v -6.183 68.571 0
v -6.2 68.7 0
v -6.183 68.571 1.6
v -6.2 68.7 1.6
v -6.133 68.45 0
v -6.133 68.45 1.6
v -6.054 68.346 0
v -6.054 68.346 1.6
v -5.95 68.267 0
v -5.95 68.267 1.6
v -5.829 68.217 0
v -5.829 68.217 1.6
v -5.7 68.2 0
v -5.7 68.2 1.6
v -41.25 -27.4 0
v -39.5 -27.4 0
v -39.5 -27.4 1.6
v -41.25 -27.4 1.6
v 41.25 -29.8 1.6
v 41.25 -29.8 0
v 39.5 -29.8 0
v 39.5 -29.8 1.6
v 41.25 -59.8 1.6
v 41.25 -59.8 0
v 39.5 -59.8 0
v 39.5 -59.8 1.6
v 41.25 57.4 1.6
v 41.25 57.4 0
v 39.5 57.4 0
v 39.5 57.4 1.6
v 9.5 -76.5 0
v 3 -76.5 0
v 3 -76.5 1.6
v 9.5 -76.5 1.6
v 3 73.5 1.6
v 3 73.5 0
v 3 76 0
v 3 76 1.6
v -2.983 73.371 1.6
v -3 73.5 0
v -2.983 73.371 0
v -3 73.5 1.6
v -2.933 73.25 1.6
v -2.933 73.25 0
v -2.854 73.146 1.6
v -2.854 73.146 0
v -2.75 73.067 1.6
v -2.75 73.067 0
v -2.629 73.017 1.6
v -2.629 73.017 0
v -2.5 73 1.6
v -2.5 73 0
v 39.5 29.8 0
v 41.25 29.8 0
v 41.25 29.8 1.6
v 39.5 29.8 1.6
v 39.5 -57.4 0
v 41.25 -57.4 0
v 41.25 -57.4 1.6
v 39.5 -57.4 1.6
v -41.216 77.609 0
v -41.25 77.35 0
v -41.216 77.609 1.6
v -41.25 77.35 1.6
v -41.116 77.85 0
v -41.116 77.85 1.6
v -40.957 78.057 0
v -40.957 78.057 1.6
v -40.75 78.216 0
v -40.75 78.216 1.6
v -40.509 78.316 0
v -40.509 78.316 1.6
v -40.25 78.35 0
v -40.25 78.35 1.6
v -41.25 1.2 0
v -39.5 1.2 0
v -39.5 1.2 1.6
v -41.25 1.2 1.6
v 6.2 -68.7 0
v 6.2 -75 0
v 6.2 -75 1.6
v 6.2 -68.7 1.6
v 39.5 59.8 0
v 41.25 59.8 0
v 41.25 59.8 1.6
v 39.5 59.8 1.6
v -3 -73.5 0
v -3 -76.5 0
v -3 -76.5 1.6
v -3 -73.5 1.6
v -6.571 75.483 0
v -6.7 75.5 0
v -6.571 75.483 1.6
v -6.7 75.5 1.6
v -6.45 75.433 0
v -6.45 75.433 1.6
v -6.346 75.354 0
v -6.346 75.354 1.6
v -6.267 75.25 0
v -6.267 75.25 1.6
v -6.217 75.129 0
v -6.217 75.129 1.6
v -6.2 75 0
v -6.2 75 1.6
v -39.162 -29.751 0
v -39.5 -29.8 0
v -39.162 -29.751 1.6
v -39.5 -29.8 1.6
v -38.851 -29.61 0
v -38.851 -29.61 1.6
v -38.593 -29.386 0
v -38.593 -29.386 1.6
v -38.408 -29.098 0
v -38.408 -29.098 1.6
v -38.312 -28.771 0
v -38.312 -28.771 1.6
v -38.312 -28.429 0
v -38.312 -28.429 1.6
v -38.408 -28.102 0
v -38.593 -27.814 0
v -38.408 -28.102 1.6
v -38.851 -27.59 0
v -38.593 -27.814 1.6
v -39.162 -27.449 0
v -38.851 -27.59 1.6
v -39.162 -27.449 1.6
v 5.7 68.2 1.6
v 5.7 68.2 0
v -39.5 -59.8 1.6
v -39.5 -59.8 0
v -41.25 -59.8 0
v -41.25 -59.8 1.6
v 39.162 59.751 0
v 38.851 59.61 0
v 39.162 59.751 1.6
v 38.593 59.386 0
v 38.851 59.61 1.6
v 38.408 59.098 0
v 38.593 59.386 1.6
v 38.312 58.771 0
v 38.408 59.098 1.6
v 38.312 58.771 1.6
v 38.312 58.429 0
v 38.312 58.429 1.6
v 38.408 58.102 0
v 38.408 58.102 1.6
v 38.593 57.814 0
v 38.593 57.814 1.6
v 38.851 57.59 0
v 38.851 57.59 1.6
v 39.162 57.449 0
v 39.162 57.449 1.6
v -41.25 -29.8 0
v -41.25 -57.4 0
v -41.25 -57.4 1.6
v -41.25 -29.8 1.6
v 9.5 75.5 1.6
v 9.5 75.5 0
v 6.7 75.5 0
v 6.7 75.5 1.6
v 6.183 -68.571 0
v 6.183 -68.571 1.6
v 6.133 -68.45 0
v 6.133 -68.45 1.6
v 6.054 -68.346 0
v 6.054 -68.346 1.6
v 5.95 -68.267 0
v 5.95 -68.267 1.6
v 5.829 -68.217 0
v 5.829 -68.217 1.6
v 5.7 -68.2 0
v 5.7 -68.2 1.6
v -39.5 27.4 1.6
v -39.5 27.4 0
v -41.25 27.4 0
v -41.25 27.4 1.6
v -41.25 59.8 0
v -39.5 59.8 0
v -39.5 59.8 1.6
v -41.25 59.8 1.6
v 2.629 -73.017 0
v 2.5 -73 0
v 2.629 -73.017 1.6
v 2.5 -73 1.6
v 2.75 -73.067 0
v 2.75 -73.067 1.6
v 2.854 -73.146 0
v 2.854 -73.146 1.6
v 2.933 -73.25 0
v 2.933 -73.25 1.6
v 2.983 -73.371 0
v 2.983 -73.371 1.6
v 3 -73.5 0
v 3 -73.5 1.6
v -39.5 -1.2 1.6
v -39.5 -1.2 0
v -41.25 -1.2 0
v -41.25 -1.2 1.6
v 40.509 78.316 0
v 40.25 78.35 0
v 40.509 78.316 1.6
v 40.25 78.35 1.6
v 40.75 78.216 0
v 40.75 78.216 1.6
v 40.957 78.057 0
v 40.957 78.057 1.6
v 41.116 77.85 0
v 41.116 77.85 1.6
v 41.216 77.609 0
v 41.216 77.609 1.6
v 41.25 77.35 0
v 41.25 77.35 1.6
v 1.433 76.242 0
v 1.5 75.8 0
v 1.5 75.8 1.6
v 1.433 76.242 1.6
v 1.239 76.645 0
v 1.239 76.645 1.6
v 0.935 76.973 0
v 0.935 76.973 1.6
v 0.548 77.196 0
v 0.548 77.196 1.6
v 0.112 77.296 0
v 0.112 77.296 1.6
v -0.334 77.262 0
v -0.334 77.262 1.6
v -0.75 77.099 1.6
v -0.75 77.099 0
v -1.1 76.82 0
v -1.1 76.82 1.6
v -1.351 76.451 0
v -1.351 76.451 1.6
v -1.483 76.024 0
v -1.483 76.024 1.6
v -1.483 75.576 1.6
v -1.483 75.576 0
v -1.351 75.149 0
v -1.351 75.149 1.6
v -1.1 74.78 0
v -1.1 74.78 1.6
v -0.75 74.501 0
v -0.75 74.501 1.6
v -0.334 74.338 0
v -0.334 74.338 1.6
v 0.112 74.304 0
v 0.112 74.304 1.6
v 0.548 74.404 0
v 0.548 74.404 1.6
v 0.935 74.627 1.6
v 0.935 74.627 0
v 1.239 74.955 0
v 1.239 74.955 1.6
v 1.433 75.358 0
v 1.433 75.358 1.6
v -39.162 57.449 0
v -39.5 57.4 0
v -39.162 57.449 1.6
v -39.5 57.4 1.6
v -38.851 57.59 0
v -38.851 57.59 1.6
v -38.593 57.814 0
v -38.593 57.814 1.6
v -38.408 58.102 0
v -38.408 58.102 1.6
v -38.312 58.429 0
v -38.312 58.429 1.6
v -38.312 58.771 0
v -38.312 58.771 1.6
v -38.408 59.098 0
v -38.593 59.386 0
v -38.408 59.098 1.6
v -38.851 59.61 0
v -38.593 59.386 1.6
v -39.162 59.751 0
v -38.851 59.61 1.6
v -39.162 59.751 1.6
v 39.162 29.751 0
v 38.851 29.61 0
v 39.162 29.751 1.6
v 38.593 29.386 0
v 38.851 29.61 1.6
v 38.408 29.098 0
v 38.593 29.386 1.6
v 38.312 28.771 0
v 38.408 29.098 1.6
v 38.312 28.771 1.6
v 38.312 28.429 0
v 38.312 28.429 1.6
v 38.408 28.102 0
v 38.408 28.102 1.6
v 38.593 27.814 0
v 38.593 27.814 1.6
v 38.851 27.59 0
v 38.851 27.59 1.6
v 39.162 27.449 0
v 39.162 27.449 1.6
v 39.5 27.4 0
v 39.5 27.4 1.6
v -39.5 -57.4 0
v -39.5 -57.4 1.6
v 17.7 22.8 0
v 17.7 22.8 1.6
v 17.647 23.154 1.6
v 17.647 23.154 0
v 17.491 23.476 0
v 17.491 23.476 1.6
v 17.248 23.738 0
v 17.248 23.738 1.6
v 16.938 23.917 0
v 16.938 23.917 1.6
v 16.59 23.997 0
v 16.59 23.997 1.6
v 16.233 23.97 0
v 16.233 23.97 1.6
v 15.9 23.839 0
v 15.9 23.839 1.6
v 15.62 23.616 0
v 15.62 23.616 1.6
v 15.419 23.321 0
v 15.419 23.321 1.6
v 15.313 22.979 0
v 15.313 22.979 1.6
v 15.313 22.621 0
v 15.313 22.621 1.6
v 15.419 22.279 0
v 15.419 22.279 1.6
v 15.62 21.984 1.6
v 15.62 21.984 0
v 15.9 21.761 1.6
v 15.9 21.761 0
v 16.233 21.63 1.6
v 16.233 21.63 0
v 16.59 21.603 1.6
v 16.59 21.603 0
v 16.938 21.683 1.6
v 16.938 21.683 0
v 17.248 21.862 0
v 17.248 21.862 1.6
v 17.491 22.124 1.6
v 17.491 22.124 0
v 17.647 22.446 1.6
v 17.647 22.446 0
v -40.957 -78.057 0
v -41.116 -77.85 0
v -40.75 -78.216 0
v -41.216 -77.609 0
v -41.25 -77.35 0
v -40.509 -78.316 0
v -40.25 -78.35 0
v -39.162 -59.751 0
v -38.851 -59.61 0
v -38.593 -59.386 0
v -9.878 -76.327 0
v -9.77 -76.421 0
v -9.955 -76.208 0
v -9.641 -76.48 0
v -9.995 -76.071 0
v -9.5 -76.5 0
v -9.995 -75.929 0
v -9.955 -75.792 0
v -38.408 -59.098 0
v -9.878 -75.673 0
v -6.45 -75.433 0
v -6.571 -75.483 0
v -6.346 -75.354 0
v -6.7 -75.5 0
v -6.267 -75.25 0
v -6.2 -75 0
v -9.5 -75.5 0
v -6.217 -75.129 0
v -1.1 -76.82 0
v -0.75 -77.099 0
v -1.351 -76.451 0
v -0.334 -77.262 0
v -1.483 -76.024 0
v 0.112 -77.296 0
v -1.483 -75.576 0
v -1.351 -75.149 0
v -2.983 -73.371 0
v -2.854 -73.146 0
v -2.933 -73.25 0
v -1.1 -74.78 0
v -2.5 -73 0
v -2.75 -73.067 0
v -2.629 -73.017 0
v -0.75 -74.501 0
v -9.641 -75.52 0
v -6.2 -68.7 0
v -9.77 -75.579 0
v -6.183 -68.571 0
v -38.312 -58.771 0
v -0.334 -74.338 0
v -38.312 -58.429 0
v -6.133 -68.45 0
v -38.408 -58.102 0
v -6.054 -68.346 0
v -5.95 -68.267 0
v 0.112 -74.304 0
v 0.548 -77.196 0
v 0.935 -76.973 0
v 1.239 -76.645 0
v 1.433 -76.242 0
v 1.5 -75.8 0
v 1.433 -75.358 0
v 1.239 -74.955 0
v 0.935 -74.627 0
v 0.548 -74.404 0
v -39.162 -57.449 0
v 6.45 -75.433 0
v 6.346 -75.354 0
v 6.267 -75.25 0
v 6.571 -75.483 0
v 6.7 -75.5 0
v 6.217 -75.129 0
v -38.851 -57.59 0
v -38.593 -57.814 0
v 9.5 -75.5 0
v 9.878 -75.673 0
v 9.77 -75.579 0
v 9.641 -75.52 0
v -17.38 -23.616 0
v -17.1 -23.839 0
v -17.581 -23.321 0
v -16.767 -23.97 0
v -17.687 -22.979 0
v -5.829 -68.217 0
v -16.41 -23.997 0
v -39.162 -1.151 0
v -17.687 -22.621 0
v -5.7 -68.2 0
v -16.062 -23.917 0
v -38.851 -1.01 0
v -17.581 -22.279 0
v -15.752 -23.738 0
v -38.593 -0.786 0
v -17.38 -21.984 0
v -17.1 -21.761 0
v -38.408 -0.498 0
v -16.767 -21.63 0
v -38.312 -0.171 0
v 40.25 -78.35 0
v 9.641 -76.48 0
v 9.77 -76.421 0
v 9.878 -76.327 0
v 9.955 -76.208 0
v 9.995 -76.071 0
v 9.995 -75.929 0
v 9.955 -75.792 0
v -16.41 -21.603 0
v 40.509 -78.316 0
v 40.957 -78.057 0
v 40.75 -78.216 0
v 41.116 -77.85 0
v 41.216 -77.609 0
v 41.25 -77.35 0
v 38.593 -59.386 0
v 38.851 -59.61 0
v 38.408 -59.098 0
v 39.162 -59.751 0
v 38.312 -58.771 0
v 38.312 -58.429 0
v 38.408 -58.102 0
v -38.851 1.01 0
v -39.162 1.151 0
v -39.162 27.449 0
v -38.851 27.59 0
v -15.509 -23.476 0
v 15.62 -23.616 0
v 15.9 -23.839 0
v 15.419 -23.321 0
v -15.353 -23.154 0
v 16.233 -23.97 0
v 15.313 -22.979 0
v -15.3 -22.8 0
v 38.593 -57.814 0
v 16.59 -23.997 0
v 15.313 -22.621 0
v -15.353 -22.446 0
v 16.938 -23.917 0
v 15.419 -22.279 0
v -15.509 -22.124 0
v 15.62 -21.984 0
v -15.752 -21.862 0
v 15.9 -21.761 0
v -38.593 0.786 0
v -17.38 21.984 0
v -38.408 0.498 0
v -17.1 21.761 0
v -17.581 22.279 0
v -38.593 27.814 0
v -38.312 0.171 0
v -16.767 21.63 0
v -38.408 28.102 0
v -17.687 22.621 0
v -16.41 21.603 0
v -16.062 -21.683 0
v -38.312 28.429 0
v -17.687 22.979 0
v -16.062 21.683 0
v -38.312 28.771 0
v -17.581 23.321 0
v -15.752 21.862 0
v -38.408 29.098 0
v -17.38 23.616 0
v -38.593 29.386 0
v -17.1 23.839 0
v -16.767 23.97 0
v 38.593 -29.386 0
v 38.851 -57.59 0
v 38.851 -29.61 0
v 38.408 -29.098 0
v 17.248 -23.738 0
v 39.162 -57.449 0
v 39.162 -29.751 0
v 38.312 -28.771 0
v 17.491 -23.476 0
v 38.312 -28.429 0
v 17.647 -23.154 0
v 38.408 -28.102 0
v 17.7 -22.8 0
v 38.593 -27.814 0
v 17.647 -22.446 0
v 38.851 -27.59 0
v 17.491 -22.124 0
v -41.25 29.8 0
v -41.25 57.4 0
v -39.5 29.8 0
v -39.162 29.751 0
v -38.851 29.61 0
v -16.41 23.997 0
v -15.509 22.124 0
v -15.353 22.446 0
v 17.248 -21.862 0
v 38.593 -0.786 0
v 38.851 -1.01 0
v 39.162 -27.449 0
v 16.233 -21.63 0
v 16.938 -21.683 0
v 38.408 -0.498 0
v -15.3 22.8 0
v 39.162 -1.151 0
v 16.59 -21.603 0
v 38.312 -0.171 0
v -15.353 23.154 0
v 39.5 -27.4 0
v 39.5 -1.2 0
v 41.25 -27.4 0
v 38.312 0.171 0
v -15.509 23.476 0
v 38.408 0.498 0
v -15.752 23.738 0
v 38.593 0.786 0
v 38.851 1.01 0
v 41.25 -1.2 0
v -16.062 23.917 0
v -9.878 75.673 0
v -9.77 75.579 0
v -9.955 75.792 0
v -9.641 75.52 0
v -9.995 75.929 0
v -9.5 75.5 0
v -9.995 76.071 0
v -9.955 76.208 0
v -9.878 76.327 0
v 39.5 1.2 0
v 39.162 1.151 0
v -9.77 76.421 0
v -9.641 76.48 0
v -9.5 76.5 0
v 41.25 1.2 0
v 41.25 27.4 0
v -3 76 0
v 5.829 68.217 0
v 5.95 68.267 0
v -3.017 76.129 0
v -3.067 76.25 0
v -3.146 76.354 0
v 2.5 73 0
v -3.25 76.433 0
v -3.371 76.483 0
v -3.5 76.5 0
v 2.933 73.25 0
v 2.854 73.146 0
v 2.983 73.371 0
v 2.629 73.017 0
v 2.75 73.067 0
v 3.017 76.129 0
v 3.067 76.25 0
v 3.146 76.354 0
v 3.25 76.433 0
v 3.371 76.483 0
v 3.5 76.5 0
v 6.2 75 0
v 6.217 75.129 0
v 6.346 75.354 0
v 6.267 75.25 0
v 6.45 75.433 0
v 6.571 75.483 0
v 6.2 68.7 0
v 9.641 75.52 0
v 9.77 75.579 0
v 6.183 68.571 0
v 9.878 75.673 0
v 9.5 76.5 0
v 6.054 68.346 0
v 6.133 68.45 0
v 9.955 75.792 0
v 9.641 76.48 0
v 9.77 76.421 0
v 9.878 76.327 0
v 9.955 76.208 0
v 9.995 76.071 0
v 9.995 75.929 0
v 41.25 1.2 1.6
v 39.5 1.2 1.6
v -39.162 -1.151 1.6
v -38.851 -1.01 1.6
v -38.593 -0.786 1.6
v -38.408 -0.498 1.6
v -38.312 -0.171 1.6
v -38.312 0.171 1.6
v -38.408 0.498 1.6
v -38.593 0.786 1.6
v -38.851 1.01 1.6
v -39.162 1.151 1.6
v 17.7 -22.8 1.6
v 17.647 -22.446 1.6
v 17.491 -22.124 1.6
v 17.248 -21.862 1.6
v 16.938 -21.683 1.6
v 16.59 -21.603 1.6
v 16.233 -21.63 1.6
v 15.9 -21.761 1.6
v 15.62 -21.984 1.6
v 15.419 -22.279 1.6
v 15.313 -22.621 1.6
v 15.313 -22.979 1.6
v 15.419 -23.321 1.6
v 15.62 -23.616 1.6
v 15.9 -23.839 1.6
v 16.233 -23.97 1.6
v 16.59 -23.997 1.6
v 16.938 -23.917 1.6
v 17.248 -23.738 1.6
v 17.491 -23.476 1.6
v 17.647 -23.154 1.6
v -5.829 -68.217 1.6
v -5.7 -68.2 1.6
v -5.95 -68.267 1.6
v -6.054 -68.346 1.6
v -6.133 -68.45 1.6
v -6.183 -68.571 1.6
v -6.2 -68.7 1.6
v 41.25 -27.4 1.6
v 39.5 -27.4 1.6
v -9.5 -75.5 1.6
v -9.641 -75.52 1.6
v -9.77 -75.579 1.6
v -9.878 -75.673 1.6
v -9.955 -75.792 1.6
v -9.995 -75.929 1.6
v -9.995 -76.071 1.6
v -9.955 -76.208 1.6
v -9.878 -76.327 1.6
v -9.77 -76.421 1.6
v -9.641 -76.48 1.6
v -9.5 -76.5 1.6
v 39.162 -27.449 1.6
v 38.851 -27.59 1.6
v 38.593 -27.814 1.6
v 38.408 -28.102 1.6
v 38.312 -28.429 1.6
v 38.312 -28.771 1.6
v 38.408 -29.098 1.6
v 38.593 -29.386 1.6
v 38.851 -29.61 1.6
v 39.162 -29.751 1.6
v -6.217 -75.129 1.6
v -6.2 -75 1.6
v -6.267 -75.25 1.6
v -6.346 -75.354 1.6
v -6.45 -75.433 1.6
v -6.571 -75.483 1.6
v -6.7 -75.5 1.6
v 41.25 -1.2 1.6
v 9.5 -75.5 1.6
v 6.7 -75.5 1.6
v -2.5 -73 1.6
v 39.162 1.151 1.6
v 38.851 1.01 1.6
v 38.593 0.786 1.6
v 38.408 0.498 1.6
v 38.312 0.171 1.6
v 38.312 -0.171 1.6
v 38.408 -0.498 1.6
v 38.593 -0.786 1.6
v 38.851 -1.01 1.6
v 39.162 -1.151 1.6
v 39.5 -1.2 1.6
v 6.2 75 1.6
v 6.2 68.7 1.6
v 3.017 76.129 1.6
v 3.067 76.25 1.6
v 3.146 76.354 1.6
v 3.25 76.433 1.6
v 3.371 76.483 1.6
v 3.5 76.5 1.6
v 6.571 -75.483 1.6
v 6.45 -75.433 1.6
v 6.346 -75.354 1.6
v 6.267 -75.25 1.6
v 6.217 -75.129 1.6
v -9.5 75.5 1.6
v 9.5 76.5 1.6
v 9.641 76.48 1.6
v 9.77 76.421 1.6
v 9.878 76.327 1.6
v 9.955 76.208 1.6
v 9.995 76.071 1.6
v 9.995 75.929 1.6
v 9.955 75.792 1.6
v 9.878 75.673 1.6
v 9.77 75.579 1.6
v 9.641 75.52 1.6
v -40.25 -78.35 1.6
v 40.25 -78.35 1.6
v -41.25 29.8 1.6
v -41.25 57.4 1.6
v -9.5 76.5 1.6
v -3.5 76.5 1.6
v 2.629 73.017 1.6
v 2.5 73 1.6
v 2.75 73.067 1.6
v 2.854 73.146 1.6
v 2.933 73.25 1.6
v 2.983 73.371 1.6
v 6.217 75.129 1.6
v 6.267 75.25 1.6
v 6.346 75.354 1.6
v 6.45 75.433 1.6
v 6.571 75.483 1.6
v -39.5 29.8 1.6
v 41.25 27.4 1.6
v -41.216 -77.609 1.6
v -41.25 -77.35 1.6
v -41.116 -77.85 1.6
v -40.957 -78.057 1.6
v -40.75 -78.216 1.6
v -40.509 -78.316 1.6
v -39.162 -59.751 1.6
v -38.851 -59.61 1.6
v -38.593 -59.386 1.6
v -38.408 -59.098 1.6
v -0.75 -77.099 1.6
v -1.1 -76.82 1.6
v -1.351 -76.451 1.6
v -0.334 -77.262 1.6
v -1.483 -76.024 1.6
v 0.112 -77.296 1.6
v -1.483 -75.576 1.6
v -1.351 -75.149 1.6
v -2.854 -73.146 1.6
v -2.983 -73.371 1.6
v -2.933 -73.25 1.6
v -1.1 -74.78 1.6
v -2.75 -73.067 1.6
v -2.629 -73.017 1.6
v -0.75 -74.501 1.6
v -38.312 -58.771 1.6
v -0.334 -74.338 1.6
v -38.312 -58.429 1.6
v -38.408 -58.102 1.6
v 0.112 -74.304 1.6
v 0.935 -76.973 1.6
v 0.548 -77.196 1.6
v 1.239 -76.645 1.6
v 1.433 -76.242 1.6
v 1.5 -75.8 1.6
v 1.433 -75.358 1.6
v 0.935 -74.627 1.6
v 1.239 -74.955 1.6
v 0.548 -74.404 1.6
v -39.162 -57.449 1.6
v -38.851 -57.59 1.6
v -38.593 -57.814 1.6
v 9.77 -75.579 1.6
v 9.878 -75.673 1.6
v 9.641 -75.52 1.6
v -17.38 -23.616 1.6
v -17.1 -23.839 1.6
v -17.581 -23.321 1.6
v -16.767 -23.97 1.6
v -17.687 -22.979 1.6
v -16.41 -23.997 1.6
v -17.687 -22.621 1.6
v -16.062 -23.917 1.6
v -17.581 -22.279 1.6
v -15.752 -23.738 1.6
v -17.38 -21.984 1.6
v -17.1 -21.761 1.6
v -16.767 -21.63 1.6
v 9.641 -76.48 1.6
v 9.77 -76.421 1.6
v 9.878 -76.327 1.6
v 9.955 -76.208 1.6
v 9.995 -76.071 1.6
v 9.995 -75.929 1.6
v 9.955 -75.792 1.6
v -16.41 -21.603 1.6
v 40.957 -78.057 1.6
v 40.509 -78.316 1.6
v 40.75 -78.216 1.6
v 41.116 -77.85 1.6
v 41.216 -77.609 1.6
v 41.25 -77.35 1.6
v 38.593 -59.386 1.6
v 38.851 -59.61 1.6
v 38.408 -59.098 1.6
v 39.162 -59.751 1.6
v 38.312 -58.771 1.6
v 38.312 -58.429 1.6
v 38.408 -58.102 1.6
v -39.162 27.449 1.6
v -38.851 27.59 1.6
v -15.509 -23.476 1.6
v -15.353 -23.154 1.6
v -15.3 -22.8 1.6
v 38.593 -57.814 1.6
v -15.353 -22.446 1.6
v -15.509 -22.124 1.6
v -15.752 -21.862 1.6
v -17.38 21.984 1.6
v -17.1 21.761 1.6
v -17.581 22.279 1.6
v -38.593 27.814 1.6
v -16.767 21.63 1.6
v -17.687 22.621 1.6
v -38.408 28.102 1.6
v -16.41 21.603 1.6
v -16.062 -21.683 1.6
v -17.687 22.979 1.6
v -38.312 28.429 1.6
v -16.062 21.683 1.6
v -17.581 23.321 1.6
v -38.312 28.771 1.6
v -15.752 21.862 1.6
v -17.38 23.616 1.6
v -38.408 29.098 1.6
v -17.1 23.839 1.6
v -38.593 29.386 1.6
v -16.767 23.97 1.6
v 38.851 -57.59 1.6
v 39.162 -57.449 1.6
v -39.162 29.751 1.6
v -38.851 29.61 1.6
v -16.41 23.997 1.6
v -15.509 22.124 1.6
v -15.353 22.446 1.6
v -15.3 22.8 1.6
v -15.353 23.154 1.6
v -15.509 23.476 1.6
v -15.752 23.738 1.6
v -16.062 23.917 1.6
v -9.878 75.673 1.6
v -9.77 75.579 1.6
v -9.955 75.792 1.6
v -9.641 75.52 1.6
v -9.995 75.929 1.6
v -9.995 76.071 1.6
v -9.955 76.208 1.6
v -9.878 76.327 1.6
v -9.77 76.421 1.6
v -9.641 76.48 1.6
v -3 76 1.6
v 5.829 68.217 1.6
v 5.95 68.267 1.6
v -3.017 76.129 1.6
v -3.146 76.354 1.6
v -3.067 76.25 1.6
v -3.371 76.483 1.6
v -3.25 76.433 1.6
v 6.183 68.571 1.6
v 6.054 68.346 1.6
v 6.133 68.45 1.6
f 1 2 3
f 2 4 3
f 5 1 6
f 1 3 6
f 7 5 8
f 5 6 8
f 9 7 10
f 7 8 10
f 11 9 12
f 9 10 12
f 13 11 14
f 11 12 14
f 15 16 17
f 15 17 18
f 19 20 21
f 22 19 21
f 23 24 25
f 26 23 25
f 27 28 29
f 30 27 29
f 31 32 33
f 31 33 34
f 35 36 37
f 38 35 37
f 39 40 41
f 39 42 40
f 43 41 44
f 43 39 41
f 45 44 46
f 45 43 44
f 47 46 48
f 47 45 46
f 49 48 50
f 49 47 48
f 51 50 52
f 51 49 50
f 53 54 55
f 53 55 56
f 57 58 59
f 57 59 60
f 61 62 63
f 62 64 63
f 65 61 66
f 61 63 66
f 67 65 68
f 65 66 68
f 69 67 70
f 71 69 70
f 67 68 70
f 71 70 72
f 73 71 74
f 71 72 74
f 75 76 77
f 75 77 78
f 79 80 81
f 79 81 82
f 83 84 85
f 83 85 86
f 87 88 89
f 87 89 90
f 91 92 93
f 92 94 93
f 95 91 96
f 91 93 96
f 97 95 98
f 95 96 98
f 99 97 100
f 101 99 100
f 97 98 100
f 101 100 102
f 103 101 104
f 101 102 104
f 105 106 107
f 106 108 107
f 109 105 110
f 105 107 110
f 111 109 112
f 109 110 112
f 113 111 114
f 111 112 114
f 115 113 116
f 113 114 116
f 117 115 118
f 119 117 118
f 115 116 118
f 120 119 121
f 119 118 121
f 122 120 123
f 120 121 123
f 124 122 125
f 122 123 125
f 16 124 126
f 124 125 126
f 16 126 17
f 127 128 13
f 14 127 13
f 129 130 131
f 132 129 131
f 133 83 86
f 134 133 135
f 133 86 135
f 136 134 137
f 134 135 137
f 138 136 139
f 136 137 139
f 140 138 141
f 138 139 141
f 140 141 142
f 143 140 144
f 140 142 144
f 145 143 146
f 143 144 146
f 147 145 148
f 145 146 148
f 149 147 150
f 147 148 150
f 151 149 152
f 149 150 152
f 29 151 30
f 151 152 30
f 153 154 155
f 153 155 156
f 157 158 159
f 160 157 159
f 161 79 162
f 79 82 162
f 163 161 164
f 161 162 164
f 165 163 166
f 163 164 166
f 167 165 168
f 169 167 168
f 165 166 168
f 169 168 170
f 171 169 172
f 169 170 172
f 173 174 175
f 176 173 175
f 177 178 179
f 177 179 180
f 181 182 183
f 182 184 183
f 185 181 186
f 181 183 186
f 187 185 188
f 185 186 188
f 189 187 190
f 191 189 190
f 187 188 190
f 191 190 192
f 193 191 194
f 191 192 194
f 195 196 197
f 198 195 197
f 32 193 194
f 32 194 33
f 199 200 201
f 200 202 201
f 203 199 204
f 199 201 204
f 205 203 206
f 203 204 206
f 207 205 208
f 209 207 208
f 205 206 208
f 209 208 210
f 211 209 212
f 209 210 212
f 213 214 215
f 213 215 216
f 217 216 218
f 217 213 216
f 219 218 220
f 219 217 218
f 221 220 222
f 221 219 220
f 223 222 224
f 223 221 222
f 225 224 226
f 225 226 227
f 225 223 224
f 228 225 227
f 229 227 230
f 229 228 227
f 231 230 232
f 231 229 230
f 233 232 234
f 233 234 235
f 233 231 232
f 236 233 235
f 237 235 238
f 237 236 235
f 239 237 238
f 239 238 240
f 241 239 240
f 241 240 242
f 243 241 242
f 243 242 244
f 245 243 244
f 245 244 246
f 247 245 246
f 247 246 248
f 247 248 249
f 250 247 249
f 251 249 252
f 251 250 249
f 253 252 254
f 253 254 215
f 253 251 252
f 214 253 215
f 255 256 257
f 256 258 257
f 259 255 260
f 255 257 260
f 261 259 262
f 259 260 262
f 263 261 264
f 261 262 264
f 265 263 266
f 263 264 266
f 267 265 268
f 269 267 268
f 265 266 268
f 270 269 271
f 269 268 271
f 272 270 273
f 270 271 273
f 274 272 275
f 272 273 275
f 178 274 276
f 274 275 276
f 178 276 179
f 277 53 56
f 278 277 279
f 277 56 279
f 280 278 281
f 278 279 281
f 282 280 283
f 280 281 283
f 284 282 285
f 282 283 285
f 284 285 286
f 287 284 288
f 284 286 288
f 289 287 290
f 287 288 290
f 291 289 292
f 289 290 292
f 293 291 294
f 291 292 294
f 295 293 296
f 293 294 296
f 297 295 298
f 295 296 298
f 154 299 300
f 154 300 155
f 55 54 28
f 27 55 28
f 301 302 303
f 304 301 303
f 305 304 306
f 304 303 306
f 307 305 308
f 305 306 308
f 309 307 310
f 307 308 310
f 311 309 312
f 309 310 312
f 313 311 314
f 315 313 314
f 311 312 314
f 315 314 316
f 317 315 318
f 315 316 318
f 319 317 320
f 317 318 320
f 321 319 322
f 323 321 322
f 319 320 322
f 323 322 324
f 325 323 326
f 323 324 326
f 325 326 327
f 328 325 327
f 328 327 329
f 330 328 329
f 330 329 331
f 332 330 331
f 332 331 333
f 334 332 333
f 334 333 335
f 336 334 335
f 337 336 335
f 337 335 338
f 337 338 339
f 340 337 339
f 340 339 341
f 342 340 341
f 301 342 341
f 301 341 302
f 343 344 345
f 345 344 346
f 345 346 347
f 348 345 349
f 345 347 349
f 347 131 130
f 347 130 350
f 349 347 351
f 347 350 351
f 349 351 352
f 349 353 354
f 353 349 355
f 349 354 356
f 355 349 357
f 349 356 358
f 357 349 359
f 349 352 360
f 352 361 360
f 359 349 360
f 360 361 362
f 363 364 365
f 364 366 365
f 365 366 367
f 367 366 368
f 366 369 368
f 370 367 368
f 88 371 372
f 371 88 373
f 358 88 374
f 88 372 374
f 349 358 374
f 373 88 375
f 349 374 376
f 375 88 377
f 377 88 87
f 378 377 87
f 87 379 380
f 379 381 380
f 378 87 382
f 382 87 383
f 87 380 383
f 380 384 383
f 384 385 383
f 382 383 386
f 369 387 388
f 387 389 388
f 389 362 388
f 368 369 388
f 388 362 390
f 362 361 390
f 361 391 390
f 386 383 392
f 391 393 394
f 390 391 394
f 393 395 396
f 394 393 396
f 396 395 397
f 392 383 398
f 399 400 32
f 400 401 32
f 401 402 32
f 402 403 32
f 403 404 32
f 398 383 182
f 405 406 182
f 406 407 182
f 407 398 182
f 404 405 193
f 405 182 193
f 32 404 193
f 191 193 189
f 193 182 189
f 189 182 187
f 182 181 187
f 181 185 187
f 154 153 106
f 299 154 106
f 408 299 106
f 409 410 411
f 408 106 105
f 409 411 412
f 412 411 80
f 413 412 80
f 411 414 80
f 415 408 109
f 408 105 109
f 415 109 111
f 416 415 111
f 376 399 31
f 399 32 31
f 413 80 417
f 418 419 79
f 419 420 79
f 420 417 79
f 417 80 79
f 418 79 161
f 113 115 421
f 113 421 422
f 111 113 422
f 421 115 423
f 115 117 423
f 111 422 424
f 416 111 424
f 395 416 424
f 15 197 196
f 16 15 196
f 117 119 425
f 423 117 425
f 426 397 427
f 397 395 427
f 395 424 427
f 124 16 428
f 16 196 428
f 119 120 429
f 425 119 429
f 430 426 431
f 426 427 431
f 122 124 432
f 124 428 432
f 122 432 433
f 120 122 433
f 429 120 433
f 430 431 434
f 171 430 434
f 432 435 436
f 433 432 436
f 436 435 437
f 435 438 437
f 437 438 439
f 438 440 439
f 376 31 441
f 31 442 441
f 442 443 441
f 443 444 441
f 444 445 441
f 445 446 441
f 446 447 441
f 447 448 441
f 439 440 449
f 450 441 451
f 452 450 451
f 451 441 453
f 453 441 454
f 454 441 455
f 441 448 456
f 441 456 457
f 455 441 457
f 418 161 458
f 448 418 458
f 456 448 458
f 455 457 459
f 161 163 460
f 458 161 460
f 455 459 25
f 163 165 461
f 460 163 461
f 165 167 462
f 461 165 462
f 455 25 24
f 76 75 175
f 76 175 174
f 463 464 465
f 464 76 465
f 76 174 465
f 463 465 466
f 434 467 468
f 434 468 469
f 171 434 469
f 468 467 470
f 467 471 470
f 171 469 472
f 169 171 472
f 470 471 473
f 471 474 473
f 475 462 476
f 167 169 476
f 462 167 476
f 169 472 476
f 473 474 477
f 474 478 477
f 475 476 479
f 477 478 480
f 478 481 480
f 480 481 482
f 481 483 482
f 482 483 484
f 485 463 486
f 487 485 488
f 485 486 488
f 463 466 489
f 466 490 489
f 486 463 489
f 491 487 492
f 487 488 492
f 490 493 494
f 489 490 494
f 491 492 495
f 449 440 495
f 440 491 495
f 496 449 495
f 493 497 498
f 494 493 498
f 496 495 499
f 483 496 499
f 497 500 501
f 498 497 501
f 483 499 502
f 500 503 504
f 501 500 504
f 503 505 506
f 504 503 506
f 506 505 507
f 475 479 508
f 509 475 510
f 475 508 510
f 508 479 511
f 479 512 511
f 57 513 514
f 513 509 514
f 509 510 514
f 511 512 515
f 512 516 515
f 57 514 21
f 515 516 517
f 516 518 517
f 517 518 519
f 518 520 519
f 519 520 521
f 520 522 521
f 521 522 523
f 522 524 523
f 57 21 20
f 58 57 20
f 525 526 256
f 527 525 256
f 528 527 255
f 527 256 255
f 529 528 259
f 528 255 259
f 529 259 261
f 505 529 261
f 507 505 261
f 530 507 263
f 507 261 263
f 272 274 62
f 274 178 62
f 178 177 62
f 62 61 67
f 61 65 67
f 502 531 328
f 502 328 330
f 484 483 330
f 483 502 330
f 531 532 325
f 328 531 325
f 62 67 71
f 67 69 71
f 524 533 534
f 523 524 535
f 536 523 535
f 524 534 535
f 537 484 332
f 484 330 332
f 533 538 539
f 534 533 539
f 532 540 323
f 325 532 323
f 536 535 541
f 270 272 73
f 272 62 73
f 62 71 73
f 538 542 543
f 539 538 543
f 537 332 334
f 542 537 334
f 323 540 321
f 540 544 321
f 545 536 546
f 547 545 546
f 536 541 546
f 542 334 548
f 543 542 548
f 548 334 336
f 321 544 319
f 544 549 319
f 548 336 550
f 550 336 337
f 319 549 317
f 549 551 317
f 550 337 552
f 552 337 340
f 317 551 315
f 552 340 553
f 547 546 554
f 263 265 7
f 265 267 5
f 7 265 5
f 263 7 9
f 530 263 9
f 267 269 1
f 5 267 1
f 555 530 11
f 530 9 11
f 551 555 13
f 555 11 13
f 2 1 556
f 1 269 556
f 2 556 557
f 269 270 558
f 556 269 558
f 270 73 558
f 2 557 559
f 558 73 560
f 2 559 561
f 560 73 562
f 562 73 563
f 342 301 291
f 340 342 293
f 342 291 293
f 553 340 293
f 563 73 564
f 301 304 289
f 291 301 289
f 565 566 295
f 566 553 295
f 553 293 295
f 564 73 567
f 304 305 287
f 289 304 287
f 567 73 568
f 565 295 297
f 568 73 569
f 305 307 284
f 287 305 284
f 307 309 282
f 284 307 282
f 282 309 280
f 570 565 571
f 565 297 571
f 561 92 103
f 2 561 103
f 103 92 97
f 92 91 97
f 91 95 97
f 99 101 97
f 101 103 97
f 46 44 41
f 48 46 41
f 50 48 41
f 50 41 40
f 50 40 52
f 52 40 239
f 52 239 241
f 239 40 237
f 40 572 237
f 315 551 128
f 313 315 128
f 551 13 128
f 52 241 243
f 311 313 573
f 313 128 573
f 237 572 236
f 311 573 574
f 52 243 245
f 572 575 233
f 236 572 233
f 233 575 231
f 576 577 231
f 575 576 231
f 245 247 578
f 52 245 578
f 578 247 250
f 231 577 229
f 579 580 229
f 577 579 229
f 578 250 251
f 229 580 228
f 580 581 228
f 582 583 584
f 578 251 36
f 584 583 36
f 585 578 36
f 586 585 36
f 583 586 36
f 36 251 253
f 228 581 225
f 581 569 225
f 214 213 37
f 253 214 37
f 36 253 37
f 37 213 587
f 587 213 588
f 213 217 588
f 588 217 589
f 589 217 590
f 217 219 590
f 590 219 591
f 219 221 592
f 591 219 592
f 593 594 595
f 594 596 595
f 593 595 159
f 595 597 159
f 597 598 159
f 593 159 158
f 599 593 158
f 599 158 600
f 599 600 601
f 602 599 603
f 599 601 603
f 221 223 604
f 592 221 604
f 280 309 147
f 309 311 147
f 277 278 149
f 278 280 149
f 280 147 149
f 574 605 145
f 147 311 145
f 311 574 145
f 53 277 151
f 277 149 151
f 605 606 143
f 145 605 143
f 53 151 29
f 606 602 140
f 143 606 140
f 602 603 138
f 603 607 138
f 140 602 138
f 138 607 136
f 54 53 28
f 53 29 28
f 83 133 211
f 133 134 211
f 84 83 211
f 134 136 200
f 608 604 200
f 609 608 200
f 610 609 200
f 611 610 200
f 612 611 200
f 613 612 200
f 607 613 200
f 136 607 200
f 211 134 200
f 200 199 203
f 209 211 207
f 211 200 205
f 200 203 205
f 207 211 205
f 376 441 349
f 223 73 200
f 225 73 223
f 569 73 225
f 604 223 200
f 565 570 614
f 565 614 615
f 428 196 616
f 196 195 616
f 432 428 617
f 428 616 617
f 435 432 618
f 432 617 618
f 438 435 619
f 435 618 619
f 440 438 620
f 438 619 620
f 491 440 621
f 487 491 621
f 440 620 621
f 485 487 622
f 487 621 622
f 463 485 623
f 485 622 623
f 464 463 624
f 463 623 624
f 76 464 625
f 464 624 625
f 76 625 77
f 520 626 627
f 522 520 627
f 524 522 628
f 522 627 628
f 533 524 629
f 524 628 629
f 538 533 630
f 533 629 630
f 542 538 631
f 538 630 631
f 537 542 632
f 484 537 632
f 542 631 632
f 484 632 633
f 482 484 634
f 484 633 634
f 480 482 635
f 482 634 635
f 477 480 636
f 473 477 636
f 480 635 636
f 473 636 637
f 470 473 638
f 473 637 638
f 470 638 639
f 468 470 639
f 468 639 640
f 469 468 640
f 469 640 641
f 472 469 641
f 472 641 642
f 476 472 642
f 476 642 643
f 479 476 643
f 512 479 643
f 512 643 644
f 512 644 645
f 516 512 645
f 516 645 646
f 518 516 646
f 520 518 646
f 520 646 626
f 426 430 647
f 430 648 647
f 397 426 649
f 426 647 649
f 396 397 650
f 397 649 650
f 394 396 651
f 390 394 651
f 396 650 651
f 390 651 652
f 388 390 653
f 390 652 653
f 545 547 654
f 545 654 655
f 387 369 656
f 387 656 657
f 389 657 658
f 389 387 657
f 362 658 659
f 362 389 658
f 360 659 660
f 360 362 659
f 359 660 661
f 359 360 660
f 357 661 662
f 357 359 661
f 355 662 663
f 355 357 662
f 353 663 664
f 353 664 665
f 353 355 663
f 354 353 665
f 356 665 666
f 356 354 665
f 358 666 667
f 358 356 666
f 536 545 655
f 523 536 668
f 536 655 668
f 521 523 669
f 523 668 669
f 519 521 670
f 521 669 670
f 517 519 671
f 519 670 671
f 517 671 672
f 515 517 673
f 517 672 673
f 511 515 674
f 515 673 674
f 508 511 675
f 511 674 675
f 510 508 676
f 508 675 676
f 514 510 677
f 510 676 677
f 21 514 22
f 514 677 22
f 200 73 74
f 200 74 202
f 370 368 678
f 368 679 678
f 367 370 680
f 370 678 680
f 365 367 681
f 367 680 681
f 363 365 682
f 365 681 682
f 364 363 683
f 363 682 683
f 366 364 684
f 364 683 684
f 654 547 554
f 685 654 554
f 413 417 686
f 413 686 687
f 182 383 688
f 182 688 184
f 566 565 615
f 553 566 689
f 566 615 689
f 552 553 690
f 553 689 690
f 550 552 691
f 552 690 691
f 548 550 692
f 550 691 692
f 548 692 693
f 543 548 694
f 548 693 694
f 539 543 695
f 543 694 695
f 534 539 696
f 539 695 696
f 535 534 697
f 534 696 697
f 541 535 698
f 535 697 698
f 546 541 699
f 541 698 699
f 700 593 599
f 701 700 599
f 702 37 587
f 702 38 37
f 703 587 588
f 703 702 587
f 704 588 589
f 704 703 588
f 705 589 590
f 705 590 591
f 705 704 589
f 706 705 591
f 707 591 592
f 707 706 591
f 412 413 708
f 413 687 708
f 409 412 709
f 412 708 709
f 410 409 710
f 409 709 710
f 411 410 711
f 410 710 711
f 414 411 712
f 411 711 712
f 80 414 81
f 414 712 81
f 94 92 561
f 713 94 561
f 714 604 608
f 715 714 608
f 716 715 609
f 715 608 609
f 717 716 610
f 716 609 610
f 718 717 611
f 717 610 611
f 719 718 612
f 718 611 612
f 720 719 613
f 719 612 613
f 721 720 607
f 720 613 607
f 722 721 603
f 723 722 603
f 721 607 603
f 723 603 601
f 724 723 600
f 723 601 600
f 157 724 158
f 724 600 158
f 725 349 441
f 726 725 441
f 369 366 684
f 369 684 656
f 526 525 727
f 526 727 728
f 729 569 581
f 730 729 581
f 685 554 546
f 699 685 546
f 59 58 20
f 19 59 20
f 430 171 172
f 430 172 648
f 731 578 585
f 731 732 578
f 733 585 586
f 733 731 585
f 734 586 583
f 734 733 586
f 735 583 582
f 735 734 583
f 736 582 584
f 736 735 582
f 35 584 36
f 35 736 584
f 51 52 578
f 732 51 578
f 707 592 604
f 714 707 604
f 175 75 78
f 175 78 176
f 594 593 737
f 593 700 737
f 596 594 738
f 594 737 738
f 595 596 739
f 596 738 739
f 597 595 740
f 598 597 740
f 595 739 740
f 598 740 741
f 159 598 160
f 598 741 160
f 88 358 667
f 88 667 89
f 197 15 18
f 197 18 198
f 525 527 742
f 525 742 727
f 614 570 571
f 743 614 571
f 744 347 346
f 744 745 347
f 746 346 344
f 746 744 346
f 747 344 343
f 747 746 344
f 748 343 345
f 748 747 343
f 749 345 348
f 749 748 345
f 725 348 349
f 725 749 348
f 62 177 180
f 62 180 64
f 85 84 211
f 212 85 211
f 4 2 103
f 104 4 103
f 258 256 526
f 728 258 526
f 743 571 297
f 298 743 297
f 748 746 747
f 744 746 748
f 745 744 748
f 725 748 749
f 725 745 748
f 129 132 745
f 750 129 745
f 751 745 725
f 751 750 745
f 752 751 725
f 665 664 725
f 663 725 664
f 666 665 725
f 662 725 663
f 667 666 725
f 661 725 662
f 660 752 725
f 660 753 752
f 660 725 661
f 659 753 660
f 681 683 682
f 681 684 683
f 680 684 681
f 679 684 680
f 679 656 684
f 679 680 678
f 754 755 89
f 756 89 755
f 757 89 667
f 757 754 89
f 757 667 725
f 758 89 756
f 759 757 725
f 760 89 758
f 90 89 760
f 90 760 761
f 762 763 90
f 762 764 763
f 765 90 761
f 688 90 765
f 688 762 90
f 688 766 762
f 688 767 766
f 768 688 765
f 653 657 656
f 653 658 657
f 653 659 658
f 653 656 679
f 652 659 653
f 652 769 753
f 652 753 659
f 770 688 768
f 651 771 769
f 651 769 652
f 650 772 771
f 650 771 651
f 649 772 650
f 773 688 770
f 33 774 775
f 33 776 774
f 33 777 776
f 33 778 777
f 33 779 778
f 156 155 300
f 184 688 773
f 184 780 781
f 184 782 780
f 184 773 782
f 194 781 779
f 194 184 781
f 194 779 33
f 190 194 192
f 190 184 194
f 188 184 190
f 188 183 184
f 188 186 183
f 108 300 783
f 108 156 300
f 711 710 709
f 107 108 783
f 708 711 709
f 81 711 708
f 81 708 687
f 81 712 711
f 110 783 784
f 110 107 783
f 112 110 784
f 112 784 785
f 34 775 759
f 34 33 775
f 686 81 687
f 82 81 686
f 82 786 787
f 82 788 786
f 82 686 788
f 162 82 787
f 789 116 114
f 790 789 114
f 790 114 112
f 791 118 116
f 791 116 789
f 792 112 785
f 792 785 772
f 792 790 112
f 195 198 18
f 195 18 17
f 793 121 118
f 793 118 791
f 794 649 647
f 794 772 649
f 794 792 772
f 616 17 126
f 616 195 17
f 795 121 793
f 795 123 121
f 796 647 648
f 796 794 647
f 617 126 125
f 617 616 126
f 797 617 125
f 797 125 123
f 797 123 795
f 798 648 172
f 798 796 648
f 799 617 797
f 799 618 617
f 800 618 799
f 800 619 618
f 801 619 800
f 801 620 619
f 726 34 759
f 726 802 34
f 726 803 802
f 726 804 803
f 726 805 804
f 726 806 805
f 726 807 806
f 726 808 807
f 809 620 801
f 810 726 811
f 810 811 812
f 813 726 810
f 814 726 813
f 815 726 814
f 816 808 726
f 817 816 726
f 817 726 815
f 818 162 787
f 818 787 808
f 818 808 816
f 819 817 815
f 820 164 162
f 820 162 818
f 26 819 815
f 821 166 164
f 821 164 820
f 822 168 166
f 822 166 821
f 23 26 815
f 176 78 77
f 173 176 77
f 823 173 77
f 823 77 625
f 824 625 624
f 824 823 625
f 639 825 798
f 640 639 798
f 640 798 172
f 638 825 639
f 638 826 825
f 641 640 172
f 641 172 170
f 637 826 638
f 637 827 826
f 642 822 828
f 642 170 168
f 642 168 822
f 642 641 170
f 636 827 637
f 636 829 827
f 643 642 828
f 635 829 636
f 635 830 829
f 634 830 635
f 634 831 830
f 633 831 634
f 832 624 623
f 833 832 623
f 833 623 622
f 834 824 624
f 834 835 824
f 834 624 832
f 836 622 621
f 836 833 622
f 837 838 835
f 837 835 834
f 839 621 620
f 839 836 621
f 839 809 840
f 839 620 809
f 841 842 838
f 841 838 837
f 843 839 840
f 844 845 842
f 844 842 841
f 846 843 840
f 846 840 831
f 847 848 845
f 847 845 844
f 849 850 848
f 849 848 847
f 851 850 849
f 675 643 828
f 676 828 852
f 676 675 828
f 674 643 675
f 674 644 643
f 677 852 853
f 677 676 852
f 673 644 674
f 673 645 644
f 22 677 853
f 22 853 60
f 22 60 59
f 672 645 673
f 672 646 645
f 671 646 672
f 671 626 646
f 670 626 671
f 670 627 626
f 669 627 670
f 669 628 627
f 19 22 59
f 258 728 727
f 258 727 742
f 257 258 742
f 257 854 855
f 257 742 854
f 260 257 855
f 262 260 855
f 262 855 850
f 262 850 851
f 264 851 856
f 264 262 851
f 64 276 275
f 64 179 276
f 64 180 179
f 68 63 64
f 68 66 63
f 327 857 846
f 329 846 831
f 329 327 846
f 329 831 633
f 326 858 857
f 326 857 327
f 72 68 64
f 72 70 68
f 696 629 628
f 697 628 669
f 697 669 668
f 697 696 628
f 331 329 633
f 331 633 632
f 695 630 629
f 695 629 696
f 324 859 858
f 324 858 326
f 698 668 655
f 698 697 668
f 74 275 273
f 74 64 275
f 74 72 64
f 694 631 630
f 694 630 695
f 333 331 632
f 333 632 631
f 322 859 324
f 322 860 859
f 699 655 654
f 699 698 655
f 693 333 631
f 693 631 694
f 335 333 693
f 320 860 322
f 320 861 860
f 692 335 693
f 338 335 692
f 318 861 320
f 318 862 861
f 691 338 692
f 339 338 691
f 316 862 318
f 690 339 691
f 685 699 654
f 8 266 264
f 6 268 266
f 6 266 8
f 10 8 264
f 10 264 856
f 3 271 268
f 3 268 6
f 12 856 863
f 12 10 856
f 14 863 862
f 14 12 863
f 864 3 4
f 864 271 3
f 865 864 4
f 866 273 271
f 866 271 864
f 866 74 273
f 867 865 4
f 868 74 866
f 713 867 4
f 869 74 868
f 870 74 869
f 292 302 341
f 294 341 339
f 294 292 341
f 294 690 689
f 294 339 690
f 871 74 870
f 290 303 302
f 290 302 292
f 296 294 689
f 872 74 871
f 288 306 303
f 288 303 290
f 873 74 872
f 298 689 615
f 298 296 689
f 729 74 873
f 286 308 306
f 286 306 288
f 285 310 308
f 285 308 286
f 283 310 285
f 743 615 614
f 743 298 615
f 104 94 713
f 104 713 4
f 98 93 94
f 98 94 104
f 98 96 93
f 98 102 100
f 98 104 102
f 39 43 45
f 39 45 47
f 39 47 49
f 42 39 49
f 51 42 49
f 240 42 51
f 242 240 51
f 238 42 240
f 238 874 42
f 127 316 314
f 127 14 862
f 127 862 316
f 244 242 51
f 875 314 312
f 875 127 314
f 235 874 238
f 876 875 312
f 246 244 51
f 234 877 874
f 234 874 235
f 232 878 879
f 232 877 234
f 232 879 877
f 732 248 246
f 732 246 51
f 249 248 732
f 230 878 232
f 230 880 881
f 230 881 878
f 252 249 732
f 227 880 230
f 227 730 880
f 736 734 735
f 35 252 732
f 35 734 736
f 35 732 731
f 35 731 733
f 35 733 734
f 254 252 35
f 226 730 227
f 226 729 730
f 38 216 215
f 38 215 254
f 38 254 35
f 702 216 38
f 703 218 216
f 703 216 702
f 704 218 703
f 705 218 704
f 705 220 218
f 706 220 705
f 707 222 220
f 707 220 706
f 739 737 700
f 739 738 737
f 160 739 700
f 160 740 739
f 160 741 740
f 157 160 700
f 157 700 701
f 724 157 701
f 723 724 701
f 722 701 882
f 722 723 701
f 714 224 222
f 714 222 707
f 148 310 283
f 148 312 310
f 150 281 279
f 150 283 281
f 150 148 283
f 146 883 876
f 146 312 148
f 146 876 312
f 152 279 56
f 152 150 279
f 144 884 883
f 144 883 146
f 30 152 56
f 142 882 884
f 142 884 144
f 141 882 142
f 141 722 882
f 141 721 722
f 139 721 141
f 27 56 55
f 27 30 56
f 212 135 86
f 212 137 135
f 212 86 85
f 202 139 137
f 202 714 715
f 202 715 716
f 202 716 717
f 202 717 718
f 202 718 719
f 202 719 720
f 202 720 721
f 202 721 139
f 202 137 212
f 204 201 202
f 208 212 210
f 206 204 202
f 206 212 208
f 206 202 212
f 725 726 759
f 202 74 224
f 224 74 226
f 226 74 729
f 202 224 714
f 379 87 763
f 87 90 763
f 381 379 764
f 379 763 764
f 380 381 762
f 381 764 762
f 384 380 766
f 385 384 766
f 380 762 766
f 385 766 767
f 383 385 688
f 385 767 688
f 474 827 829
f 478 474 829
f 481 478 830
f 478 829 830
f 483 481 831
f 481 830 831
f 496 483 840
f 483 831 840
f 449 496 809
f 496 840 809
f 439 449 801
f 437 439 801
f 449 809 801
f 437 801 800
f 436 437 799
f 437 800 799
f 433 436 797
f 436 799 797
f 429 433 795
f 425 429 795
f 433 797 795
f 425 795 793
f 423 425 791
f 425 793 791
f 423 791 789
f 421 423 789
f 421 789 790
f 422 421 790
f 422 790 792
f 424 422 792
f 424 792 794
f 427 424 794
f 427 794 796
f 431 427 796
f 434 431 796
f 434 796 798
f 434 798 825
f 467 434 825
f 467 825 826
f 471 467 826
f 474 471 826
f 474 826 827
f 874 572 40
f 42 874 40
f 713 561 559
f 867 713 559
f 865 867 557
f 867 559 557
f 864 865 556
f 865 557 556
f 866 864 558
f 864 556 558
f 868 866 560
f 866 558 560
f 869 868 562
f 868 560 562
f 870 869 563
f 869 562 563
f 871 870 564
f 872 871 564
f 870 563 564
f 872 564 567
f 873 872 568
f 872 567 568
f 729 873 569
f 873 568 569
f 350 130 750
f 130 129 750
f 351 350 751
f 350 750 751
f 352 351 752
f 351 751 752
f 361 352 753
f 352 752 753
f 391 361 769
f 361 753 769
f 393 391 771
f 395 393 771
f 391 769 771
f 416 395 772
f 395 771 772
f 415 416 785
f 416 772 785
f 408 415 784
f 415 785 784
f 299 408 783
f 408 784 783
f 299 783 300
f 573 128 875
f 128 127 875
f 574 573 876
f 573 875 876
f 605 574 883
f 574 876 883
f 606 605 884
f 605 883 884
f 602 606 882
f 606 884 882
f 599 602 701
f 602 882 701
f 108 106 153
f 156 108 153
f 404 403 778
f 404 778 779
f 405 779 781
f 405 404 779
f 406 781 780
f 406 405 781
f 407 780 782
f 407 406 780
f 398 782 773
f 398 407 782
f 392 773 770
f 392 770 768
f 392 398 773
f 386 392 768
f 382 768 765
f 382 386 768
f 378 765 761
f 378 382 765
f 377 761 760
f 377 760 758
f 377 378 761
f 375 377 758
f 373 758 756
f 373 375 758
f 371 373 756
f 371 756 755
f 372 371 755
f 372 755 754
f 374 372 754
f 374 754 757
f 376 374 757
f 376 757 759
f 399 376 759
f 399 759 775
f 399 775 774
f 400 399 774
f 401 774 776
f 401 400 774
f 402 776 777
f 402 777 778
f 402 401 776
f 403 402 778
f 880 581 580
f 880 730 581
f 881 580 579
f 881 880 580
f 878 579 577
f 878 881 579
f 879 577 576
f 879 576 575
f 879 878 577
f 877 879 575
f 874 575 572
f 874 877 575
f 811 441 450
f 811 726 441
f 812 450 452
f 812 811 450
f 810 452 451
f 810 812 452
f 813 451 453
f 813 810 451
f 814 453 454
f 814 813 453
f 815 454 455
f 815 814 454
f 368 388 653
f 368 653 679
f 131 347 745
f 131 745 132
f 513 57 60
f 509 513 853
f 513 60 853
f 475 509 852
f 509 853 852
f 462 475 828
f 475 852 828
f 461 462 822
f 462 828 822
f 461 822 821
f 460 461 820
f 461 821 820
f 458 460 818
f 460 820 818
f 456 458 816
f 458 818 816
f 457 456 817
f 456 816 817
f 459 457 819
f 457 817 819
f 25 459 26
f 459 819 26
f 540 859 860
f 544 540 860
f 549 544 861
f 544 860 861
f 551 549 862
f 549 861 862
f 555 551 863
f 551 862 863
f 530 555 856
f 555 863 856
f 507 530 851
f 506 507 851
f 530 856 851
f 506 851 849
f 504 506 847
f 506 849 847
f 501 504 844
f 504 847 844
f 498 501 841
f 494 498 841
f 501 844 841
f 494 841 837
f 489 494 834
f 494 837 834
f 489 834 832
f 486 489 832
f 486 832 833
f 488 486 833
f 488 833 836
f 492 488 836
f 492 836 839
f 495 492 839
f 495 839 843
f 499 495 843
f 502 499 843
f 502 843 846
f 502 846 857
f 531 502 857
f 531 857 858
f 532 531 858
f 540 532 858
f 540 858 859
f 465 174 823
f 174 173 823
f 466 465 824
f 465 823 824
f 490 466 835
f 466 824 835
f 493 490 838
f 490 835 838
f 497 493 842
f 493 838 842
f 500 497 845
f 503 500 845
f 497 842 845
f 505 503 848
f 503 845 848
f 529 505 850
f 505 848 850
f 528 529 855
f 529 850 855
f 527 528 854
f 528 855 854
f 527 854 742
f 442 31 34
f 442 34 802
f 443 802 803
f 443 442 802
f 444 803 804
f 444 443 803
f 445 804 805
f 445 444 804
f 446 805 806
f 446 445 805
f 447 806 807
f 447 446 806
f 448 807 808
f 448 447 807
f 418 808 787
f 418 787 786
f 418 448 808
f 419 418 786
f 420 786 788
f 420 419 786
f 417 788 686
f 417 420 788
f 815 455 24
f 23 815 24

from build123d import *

# Parameters (mm, degrees)
SKETCH1_W                    = 82.5
SKETCH1_H                    = 156.7
SKETCH1_R                    = 0.8
SKETCH1_R_2                  = 1.5
BASE_SHAPE_DEPTH             = 1.6
PCB_CORNER_FILLETS_R         = 1
SKETCH6_R                    = 1.5
SOLAR_CONNECTOR_CUTOUT_DEPTH = 1.6
SOLAR_HOLE_FILLETS_R         = 0.5
M2_CLEARANCE_HOLE1_D         = 2.4
M2_CLEARANCE_HOLE1_DEPTH     = 1.6
SKETCH10_W                   = 1.75
SKETCH10_H                   = 2.4
SCREW_SLOTS_DEPTH            = 89.559838527


with BuildPart() as part:
    # Sketch1 → Base shape (new body)
    with BuildSketch(Plane.XY):
        Rectangle(SKETCH1_W, SKETCH1_H)
        with Locations((-39.5, 58.6)):
            Circle(SKETCH1_R, mode=Mode.SUBTRACT)
        with Locations((-39.5, 28.6)):
            Circle(SKETCH1_R, mode=Mode.SUBTRACT)
        with Locations((-39.5, 0)):
            Circle(SKETCH1_R, mode=Mode.SUBTRACT)
        with Locations((-39.5, -28.6)):
            Circle(SKETCH1_R, mode=Mode.SUBTRACT)
        with Locations((-39.5, -58.6)):
            Circle(SKETCH1_R, mode=Mode.SUBTRACT)
        with Locations((0, -75.8)):
            Circle(SKETCH1_R_2, mode=Mode.SUBTRACT)
        with Locations((39.5, -58.6)):
            Circle(SKETCH1_R, mode=Mode.SUBTRACT)
        with Locations((39.5, -28.6)):
            Circle(SKETCH1_R, mode=Mode.SUBTRACT)
        with Locations((39.5, 0)):
            Circle(SKETCH1_R, mode=Mode.SUBTRACT)
        with Locations((39.5, 28.6)):
            Circle(SKETCH1_R, mode=Mode.SUBTRACT)
        with Locations((39.5, 58.6)):
            Circle(SKETCH1_R, mode=Mode.SUBTRACT)
        with Locations((-16.5, 22.8)):
            Circle(SKETCH1_R, mode=Mode.SUBTRACT)
        with Locations((-16.5, -22.8)):
            Circle(SKETCH1_R, mode=Mode.SUBTRACT)
        with Locations((16.5, -22.8)):
            Circle(SKETCH1_R, mode=Mode.SUBTRACT)
        with Locations((16.5, 22.8)):
            Circle(SKETCH1_R, mode=Mode.SUBTRACT)
        with Locations((0, 75.8)):
            Circle(SKETCH1_R_2, mode=Mode.SUBTRACT)
    extrude(amount=BASE_SHAPE_DEPTH)

    # PCB corner fillets
    pcb_corner_fillets_edges = [part.edges().sort_by_distance(p)[0] for p in [
        (41.25, -78.35, 0.8),
        (-41.25, -78.35, 0.8),
        (-41.25, 78.35, 0.8),
        (41.25, 78.35, 0.8),
    ]]
    fillet(pcb_corner_fillets_edges, radius=PCB_CORNER_FILLETS_R)

    # Sketch6 → Solar connector cutout (cut)
    with BuildSketch(Plane(origin=(0, 0, 0), x_dir=(-1, 0, 0), z_dir=(0, 0, -1))):
        with Locations(Location((0, 75.8, 0), (0, 0, 180))):
            Circle(SKETCH6_R)
        with BuildLine():
            Line((9.5, 76.5), (3, 76.5))
            Line((3, 76.5), (3, 73))
            Line((3, 73), (-3, 73))
            Line((-3, 73), (-3, 76.5))
            Line((-3, 76.5), (-9.5, 76.5))
            ThreePointArc((-9.5, 76.5), (-10, 76), (-9.5, 75.5))
            Line((-9.5, 75.5), (-6.2, 75.5))
            Line((-6.2, 75.5), (-6.2, 68.2))
            Line((-6.2, 68.2), (6.2, 68.2))
            Line((6.2, 68.2), (6.2, 75.5))
            Line((6.2, 75.5), (9.5, 75.5))
            ThreePointArc((9.5, 75.5), (10, 76), (9.5, 76.5))
        make_face()
    solar_connector_cutout = extrude(amount=-SOLAR_CONNECTOR_CUTOUT_DEPTH, mode=Mode.SUBTRACT)

    # Mirror solar cutout: Solar connector cutout across plane
    add(solar_connector_cutout.mirror(Plane.ZX), mode=Mode.SUBTRACT)

    # Solar Hole fillets
    solar_hole_fillets_edges = [part.edges().sort_by_distance(p)[0] for p in [
        (-3, 76.5, 0.8),
        (-3, 73, 0.8),
        (3, 73, 0.8),
        (3, 76.5, 0.8),
        (6.2, 75.5, 0.8),
        (6.2, 68.2, 0.8),
        (-6.2, 68.2, 0.8),
        (-6.2, 75.5, 0.8),
        (-3, -73, 0.8),
        (3, -73, 0.8),
        (6.2, -75.5, 0.8),
        (6.2, -68.2, 0.8),
        (-6.2, -68.2, 0.8),
        (-6.2, -75.5, 0.8),
    ]]
    fillet(solar_hole_fillets_edges, radius=SOLAR_HOLE_FILLETS_R)

    # M2 Clearance Hole1
    with Locations(Plane(origin=(39.5, 58.6, 0), x_dir=(-1, 0, 0), z_dir=(0, 0, -1))):
        with Locations((0, 0), (0, -30), (23, -35.8), (56, -35.8), (79, -30), (79, 0), (79, -58.6), (0, -58.6), (23, -81.4), (56, -81.4), (79, -87.2), (0, -87.2), (0, -117.2), (79, -117.2)):
            Hole(M2_CLEARANCE_HOLE1_D / 2, depth=M2_CLEARANCE_HOLE1_DEPTH)

    # Sketch10 → Screw Slots (cut, through all)
    with BuildSketch(Plane(origin=(0, 0, 0), x_dir=(-1, 0, 0), z_dir=(0, 0, -1))):
        with Locations((40.375, 58.6)):
            Rectangle(SKETCH10_W, SKETCH10_H)
        with Locations((40.375, 28.6)):
            Rectangle(SKETCH10_W, SKETCH10_H)
        with Locations((40.375, 0)):
            Rectangle(SKETCH10_W, SKETCH10_H)
        with Locations((40.375, -28.6)):
            Rectangle(SKETCH10_W, SKETCH10_H)
        with Locations((40.375, -58.6)):
            Rectangle(SKETCH10_W, SKETCH10_H)
        with Locations((-40.375, -58.6)):
            Rectangle(SKETCH10_W, SKETCH10_H)
        with Locations((-40.375, -28.6)):
            Rectangle(SKETCH10_W, SKETCH10_H)
        with Locations((-40.375, 0)):
            Rectangle(SKETCH10_W, SKETCH10_H)
        with Locations((-40.375, 28.6)):
            Rectangle(SKETCH10_W, SKETCH10_H)
        with Locations((-40.375, 58.6)):
            Rectangle(SKETCH10_W, SKETCH10_H)
    extrude(amount=-SCREW_SLOTS_DEPTH, mode=Mode.SUBTRACT)


solid = part.part
